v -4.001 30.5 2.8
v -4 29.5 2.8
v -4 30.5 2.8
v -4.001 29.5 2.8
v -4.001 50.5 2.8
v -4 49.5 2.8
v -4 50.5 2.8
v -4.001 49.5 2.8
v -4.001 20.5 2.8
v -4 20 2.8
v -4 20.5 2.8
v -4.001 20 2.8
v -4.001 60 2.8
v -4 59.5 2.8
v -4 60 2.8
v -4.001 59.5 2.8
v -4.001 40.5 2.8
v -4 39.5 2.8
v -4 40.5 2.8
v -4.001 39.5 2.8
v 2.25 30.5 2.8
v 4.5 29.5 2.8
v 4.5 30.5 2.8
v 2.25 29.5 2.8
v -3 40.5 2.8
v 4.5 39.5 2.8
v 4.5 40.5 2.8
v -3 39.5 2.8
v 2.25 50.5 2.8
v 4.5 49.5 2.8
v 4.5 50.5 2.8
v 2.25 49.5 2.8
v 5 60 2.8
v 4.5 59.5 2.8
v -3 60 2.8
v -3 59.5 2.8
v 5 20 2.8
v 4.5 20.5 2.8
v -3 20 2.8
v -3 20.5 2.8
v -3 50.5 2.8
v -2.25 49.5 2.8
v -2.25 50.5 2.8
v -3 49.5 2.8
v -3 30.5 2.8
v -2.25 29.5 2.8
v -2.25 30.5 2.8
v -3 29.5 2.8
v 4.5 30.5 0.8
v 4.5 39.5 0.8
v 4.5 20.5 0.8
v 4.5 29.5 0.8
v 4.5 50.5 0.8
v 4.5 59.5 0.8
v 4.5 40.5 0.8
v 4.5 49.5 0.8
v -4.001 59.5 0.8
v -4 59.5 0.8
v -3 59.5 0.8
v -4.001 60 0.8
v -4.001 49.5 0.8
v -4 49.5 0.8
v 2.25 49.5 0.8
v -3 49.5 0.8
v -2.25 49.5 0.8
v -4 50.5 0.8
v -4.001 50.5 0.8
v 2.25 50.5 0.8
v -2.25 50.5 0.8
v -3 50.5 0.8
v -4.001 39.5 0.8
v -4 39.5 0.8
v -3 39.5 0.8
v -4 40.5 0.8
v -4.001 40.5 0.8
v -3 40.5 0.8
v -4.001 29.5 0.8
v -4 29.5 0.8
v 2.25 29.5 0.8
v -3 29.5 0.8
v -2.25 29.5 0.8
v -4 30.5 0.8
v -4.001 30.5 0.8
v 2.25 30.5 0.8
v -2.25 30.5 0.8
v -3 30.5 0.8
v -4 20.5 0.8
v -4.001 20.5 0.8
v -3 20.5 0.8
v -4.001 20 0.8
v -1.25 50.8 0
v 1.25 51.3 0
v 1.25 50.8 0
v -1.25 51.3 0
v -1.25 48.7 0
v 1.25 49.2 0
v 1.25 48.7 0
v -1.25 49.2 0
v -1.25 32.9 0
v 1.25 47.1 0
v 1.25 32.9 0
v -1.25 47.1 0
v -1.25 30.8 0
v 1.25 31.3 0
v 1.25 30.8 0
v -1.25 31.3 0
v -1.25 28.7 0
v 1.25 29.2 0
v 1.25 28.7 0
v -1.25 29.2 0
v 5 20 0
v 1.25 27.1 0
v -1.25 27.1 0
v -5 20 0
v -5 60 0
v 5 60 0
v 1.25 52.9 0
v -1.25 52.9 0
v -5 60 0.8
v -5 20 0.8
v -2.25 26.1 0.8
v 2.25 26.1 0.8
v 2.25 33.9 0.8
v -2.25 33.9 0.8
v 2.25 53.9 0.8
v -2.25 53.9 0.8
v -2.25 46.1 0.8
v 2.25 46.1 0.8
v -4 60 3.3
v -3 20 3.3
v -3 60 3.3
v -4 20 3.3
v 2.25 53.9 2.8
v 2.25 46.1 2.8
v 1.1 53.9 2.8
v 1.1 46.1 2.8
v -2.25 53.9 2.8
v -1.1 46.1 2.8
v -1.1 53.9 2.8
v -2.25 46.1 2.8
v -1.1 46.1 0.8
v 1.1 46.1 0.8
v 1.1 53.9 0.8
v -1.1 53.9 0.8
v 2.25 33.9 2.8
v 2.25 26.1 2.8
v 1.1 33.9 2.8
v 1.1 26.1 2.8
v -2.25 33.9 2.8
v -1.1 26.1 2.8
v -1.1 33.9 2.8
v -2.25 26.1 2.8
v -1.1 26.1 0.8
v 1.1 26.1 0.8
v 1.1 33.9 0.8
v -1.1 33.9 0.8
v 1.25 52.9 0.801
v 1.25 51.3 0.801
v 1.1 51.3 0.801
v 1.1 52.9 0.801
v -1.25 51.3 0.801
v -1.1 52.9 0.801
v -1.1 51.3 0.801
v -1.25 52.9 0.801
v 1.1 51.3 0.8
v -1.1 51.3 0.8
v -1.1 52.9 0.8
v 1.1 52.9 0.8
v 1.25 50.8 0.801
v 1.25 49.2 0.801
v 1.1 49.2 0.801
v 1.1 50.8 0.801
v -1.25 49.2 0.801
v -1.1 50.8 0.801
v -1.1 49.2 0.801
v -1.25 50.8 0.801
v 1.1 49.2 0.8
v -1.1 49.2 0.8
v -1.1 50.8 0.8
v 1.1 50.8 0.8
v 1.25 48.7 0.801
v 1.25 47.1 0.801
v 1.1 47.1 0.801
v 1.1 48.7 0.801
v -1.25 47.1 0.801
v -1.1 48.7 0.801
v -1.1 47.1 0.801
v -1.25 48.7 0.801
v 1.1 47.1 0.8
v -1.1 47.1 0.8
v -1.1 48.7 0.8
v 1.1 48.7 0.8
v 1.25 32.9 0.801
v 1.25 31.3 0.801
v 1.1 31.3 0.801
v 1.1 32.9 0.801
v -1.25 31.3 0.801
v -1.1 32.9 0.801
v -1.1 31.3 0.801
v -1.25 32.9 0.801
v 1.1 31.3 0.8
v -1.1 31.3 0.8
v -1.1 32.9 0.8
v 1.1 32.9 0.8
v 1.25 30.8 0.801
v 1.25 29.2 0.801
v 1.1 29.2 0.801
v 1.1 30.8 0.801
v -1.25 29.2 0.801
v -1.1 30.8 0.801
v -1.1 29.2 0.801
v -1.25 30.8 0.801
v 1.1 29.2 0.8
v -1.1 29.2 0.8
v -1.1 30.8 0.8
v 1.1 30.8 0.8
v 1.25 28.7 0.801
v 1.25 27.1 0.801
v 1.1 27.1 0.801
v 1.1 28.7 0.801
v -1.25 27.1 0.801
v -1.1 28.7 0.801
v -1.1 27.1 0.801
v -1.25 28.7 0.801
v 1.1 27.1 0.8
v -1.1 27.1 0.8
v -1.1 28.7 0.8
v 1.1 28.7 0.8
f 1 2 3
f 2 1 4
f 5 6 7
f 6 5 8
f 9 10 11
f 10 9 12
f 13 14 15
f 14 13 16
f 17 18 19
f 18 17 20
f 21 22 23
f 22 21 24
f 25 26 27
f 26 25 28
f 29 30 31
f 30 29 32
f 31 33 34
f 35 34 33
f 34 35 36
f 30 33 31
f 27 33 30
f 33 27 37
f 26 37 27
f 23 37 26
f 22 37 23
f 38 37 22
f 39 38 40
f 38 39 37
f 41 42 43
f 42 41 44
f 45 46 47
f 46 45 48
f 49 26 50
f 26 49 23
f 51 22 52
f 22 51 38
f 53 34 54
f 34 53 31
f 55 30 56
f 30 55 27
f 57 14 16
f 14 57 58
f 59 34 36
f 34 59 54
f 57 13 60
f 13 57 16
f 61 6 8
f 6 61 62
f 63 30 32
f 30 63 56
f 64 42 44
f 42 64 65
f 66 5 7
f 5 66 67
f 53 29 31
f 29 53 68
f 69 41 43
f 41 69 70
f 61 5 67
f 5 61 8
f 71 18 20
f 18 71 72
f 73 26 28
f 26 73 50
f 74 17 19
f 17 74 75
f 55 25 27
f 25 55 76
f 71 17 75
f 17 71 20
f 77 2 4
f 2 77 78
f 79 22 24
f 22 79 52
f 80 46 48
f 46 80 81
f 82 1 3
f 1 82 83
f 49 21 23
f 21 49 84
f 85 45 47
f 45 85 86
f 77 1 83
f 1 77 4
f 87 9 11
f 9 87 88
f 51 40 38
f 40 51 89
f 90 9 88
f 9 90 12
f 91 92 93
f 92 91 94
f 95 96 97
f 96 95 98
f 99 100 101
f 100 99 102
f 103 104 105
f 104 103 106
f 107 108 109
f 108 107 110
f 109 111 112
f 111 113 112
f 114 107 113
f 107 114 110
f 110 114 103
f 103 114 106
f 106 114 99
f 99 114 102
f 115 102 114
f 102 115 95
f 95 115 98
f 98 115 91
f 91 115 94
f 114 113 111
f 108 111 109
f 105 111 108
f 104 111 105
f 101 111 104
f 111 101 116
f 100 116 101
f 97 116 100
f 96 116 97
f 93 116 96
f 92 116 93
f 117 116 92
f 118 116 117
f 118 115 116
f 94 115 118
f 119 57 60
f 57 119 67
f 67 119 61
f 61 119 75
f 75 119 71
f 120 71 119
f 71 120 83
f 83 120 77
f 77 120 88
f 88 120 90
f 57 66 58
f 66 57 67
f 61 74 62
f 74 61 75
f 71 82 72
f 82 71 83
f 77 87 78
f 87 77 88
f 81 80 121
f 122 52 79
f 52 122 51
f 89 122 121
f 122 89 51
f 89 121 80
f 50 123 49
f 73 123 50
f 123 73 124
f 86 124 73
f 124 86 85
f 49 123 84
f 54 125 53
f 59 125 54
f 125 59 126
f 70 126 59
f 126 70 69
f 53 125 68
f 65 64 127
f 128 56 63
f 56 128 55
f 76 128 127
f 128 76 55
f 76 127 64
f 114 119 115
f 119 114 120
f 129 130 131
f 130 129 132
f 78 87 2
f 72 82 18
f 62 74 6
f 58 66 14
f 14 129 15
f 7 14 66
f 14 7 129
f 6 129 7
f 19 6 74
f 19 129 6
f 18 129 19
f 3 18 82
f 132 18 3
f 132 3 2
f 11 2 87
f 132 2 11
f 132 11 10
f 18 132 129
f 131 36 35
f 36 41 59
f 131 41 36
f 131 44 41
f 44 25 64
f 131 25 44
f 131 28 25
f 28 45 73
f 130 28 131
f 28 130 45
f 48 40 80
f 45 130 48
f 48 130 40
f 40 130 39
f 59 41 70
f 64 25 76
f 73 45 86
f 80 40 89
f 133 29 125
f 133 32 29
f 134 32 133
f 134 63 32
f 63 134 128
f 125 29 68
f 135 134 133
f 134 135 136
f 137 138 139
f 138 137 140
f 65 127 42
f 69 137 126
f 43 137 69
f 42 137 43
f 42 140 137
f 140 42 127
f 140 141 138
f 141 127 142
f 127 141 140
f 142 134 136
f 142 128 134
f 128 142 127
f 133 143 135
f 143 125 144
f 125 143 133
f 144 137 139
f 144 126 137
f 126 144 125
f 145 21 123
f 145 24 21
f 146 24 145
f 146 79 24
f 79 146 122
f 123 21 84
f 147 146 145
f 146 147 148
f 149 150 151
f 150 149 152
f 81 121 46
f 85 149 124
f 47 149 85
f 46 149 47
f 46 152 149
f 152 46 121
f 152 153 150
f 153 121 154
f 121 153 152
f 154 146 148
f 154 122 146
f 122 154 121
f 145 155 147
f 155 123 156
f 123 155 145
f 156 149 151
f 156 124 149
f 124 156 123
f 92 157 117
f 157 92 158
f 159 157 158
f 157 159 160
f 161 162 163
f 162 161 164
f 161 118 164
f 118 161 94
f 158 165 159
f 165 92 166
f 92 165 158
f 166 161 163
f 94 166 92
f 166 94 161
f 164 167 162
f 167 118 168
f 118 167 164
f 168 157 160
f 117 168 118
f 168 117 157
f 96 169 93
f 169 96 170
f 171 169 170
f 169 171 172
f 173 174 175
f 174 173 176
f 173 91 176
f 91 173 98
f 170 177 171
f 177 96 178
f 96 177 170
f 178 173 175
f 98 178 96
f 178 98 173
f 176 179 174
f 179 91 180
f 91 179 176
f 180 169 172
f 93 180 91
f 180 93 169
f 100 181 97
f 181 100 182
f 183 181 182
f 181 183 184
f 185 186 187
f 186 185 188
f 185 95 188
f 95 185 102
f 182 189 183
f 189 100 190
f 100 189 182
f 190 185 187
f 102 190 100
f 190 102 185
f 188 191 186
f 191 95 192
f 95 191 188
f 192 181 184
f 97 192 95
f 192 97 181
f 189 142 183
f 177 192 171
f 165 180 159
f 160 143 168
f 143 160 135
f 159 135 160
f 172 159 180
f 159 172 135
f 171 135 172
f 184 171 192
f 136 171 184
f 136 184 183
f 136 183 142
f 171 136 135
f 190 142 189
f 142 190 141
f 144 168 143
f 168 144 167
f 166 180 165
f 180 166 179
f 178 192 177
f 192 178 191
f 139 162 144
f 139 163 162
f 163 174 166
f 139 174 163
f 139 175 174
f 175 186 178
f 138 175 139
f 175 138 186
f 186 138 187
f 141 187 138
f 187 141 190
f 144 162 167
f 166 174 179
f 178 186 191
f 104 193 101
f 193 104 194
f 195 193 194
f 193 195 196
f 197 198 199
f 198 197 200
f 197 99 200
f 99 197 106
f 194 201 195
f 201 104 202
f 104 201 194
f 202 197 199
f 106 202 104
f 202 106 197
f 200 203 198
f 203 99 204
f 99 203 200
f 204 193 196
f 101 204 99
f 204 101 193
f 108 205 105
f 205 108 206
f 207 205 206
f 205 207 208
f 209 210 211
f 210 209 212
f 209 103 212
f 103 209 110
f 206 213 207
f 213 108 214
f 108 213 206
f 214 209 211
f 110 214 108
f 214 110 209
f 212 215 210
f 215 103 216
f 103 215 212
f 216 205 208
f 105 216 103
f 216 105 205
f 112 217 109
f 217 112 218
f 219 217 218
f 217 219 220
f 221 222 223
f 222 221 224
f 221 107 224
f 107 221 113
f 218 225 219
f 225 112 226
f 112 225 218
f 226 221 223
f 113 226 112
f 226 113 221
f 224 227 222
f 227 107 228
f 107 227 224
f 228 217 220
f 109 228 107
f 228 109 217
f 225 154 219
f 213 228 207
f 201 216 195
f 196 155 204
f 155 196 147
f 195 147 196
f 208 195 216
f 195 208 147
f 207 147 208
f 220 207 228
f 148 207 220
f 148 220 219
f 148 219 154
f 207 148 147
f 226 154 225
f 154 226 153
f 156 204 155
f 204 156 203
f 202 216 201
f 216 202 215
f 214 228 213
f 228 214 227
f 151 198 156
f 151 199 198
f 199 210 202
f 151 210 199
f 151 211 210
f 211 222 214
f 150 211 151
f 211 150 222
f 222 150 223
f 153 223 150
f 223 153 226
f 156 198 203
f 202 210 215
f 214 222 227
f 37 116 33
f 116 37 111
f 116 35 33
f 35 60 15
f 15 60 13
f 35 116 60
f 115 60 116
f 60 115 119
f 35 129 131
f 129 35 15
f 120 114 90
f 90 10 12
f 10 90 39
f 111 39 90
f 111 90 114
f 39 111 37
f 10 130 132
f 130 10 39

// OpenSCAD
// file: usb.scad
e=.001;
$fn=48;

usb_c_depth = 7.35;
usb_c_width = 8.45;
usb_c_height = 2.56;
usb_c_z = .25;
usb_c_edge_radius = .93;
usb_c_front_from_origin = 6.77-3.13;
usb_c_plug_end = 1.77-3.13;

usb_c_plug_depth = 7;
usb_c_plug_width = 8;
usb_c_plug_height = 2;

usb_c_plug_shroud_width = 12.5;
usb_c_plug_shroud_height = 6.25;
usb_c_plug_shroud_depth = 15;
usb_c_plug_shroud_radius = .5;

usb_a_depth = 10;
usb_a_width = 13.2;
usb_a_height = 5.7;
usb_a_edge_radius = .5;
usb_a_z = 1.;
usb_a_overlap = .65;
usb_a_plastic_depth = 4.5;
usb_a_plastic_width = 14.5;
usb_a_plastic_height = 4;
usb_a_plastic_z = usb_a_z + 1.;



usb_a_plug_depth = 12.5;
usb_a_plug_width = 12.1;
usb_a_plug_height = 4.5;
usb_a_plug_radius = .5;
usb_a_plug_end = -8;

usb_a_plug_shroud_width = 16;
usb_a_plug_shroud_height = 8;
usb_a_plug_shroud_depth = 25;
usb_a_plug_shroud_radius = .5;

module rounded_rect(w, h, r, center=false)
{
	off_x = center ? w/2 : 0 ;
	off_y = center ? h/2 : 0 ;
	hull()
	{
		for (x=[r,w-r])
		for (y=[r,h-r])
		translate([off_x+x,off_y+y])
		circle(r=r);
	}
}

module usb_c_keepout()
{
	color([.9,.9,.9])
	{
		translate([-10, -9.2/2.+1.25, 0])
			cube([20, 9.2-2.5, 3.2]);
		
		for (y=[-9.2/2.+1.25, 9.2/2.-1.25])
			translate([-10, y, 1.6])
				rotate([0,90,0])
					scale([1.6,1.25,1])
						cylinder(h=20, r=1);
	}
}

module usb_c_plug(margin=0)
{
color([.97,.97,.97])

translate([-usb_c_plug_width/2-margin,
            usb_c_plug_depth+margin,
           -usb_c_plug_height/2-margin ])
rotate([90,0,0])
linear_extrude(usb_c_plug_depth+2*margin+e) rounded_rect(usb_c_plug_width+2*margin, usb_c_plug_height+2*margin, usb_c_plug_height/2+margin);
	
color([.3,.3,.3])

translate([-usb_c_plug_shroud_width/2-margin,
            usb_c_plug_depth+usb_c_plug_shroud_depth+margin,
           -usb_c_plug_shroud_height/2-margin ])
rotate([90,0,0])
linear_extrude(usb_c_plug_shroud_depth+2*margin+e) rounded_rect(usb_c_plug_shroud_width+2*margin, usb_c_plug_shroud_height+2*margin, usb_c_plug_shroud_radius+margin);
	

}

module usb_c_type_c31_m12(margin=0)
{
	translate([0,0,usb_c_z])
	{
		color([.9,.9,.9])
			translate([-usb_c_width/2-margin,usb_c_front_from_origin+margin,-margin ])
				rotate([90,0,0])
					linear_extrude(usb_c_depth+2*margin) rounded_rect(usb_c_width+2*margin, usb_c_height+2*margin, usb_c_edge_radius+margin);

		translate([0,usb_c_plug_end,usb_c_height/2])
			children();
	}
}


module usb_a_shou_han(margin=0)
{
	color([.9,.9,.9])
	{
translate([-usb_a_width/2-margin,usb_a_overlap+margin,usb_a_z -margin ])
rotate([90,0,0])
linear_extrude(usb_a_depth+2*margin) rounded_rect(usb_a_width+2*margin, usb_a_height+2*margin, usb_a_edge_radius+margin);
	}
	color([.1,.1,.1])
	{
translate([-usb_a_plastic_width/2-margin,usb_a_overlap+margin-usb_a_depth+usb_a_plastic_depth+e,usb_a_plastic_z -margin ])
rotate([90,0,0])
cube([usb_a_plastic_width+2*margin, usb_a_plastic_height+2*margin, usb_a_plastic_depth+2*margin]);
	}
	translate([0,usb_a_plug_end/*+8.65*/,usb_a_height/2+usb_a_z]) children();

}


module usb_a_plug(margin=0)
{
color([.97,.97,.97])

translate([-usb_a_plug_width/2-margin,
            usb_a_plug_depth+margin,
           -usb_a_plug_height/2-margin ])
rotate([90,0,0])
linear_extrude(usb_a_plug_depth+2*margin+e) rounded_rect(usb_a_plug_width+2*margin, usb_a_plug_height+2*margin, usb_a_plug_radius+margin);
	
color([.3,.3,.3])

translate([-usb_a_plug_shroud_width/2-margin,
            usb_a_plug_depth+usb_a_plug_shroud_depth+margin,
           -usb_a_plug_shroud_height/2-margin ])
rotate([90,0,0])
linear_extrude(usb_a_plug_shroud_depth+2*margin+e) rounded_rect(usb_a_plug_shroud_width+2*margin, usb_a_plug_shroud_height+2*margin,usb_a_plug_shroud_radius+margin);
	

}


translate([20,0,0])usb_c_type_c31_m12(margin=0) usb_c_plug(margin=0);

usb_a_shou_han(margin=0) usb_a_plug(margin=0);
// file: case.scad
e=.001;
$fn=48;
padding=5;

use <usb.scad>

hole_dist_x = 40;
hole_dist_y = 80;
pcb_thickness = 1.6;
pcb_radius = 3;
inner_radius = 4;
wall_thickness = 1;
wall_height = 9.6;
thread = 3;
bottom_thickness = .8;
border_width = 1.;
top_thickness = .8;
top_edge_height = 2.5;
top_edge_width = 1.;
top_edge_margin = 0.;
top_grid_height = 2;
grid_width=1;
leg_height = .6;
leg_radius = 2.7;
usb_c_board_offset = 3; // based on kicad position
screw_tension_gap = 0;


lightpipe_width = 2.5;
lightpipe_height = 1.6;
lightpipe_bar_width = 2.2;
lightpipe_guide_thickness = 2;
lightpipe_guide_border = 1;

led_pitch = 2.1;
led_x = hole_dist_x;

led_clearance = 1.8;
outer_radius = inner_radius+wall_thickness;
screw_fit_radius = (thread*0.9)/2;
total_height = bottom_thickness+wall_height+top_thickness;
component_z = bottom_thickness+leg_height+pcb_thickness;

module notched_block(height, radius, notch_size)
{
	translate([notch_size-radius,-radius, 0])
		cube([hole_dist_x-2*(notch_size-radius), hole_dist_y+2*notch_size, height]);
	translate([-notch_size, notch_size-radius, 0])
		cube([hole_dist_x+2*notch_size, hole_dist_y-2*(notch_size-radius), height]);
}

module rounded_block(height, radius)
{
	notched_block(height, radius, radius);
	at_holes() cylinder(h=height, r=radius);
}


module preview()
{
	if ($preview) children();
}

module usb_c(margin=0)
{
	translate([0,-usb_c_board_offset,0]) 
	usb_c_type_c31_m12(margin) usb_c_plug(margin);
}

module usb_a(margin=0)
{
	usb_a_shou_han(margin) usb_a_plug(margin);
}

module usb_a_keepout()
{
	usb_a_shou_han(.25) usb_a_plug(.5);
}

module usb_c_keepout()
{
	usb_c(margin=.5);
}

module on_pcb()
{
	translate([0,0,component_z]) children();
}

module at_front()
{
	translate([hole_dist_x+pcb_radius,hole_dist_y/2,0]) rotate([0,0,-90])  children();
}

module at_top()
{
	translate([hole_dist_x/2,hole_dist_y+pcb_radius,0]) children();
}

module usb_a_locations()
{
	at_front() for (x=[-30,-10,10,30] ) translate([x, 0, 0]) children();
}

module led_locations()
{
	for (dy=[-30,-10,10,30] ) translate([0, hole_dist_y/2+dy, 0]) children();
}

module at_holes(x, y)
{
	for (x = [0, hole_dist_x])
		for (y = [0, hole_dist_y])
			translate([x,y,0])
				children();
}

module leg(h)
{
	difference()
	{
	translate([0,0,-e])
		cylinder(h=h+e, r=leg_radius);
	translate([0,0,-e*2])
		cylinder(h=h+e*3, r=screw_fit_radius);
	}
}

module pcb()
{
	translate([0,0,bottom_thickness+leg_height])
		color("green")
			rounded_block(pcb_thickness, pcb_radius);
}

module h_grid(n, pitch, depth, w, h)
{
	translate([-w/2,-depth/2, 0])
		for (i=[0:n-1])
			translate([(i-(n-1)/2)*pitch,0,0])
				cube([w, depth, h]);
}

module grid(w, h, n_rows, row_pitch, n_cols, col_pitch, bar_w, bar_h)
{
	translate([hole_dist_x/2,hole_dist_y/2,0])
	{
		h_grid(n_rows, row_pitch, h, bar_w, bar_h);
		rotate([0,0,90])
		h_grid(n_cols, col_pitch, w, bar_w, bar_h);
	}
}


module case()
{
	at_holes() translate([0, 0, bottom_thickness])leg(leg_height);

	difference()
	{
		difference()
		{
			rounded_block(bottom_thickness+wall_height, outer_radius);
			translate([0,0,bottom_thickness]) rounded_block(wall_height+e, inner_radius);
		}
		union()
		{
			at_holes() translate([0,0,-e]) cylinder(bottom_thickness+2*e, r=screw_fit_radius);
			on_pcb()
			{
				at_top() usb_c_keepout();
				usb_a_locations() usb_a_keepout();
			}
		}
	}

	translate([0,0,bottom_thickness-e]) grid(hole_dist_x+(outer_radius-e)*2, hole_dist_y+(outer_radius-e)*2, 4, 10, 7, 10, grid_width, leg_height+e);
}

module light_pipe(n_leds)
{
	for (i=[0:n_leds-1])
	{
		dy = (i-(n_leds-1)/2)*led_pitch;
		w = lightpipe_width;
		h = lightpipe_height;
		z = total_height-top_thickness;
		translate([-w/2, -h/2+dy, z-e]) 
			cube( [w,h,top_thickness+e*2] );
	}
	w = lightpipe_bar_width;
	h = led_pitch*(n_leds-1)+lightpipe_height+lightpipe_guide_border*2;
	z = component_z + led_clearance;
    d = total_height-top_thickness-z;

	translate([-w/2,-h/2-e,z-e]) 
		cube([w, h+2*e, d+e]);

}

module light_pipe_guide(n_leds)
{
	w = lightpipe_width+lightpipe_guide_border*2;
	h = led_pitch*(n_leds-1)+lightpipe_height+lightpipe_guide_border*2;
	d = lightpipe_guide_thickness;
	z = wall_height+bottom_thickness-lightpipe_guide_thickness;
	translate([-w/2,-h/2,z]) 
		cube([w, h, d+e]);
}

module leds_hub()
{
	translate([6,hole_dist_y,0])
		children();
}


module top()
{
	difference()
	{
		union()
		{
		translate([0,0,bottom_thickness+wall_height])
		{
			translate([0,0,-top_grid_height]) grid(hole_dist_x+(inner_radius+e)*2, hole_dist_y+(inner_radius+e)*2, 4, 10, 7, 10, grid_width, top_grid_height+e);

			rounded_block(top_thickness, outer_radius);
			difference()
			{
				translate([0,0,-top_edge_height])
				rounded_block(top_edge_height+e, inner_radius-top_edge_margin);
				translate([0,0,-top_edge_height-e])
				rounded_block(top_edge_height+2*e, inner_radius-top_edge_margin-top_edge_width);
			}
		}
			on_pcb() translate([0,0,screw_tension_gap]) at_holes() leg(wall_height-pcb_thickness-leg_height+e);
			led_locations() light_pipe_guide(3);
			leds_hub() light_pipe_guide(2);
		}

		union()
		{
		on_pcb()
		{
			at_top() usb_c_keepout();
			usb_a_locations() usb_a_keepout();
		}
		led_locations() light_pipe(3);
		leds_hub() light_pipe(2);
		}
	}
}

module flip()
{
	translate([0,hole_dist_y,bottom_thickness+wall_height+top_thickness]) rotate([180,0,0]) children();
}

module next()
{
	translate([-hole_dist_x-2*outer_radius-padding,0 , 0]) children();
}

preview()
{
	pcb();
	on_pcb()
	{
		at_top() usb_c();
		usb_a_locations() usb_a();
	}
}

case();
next() 
flip()
top();
// main file
use <case.scad>

intersection()
{
flip()
top();
translate([-5,20,0]) cube([10,40,100]);
}
